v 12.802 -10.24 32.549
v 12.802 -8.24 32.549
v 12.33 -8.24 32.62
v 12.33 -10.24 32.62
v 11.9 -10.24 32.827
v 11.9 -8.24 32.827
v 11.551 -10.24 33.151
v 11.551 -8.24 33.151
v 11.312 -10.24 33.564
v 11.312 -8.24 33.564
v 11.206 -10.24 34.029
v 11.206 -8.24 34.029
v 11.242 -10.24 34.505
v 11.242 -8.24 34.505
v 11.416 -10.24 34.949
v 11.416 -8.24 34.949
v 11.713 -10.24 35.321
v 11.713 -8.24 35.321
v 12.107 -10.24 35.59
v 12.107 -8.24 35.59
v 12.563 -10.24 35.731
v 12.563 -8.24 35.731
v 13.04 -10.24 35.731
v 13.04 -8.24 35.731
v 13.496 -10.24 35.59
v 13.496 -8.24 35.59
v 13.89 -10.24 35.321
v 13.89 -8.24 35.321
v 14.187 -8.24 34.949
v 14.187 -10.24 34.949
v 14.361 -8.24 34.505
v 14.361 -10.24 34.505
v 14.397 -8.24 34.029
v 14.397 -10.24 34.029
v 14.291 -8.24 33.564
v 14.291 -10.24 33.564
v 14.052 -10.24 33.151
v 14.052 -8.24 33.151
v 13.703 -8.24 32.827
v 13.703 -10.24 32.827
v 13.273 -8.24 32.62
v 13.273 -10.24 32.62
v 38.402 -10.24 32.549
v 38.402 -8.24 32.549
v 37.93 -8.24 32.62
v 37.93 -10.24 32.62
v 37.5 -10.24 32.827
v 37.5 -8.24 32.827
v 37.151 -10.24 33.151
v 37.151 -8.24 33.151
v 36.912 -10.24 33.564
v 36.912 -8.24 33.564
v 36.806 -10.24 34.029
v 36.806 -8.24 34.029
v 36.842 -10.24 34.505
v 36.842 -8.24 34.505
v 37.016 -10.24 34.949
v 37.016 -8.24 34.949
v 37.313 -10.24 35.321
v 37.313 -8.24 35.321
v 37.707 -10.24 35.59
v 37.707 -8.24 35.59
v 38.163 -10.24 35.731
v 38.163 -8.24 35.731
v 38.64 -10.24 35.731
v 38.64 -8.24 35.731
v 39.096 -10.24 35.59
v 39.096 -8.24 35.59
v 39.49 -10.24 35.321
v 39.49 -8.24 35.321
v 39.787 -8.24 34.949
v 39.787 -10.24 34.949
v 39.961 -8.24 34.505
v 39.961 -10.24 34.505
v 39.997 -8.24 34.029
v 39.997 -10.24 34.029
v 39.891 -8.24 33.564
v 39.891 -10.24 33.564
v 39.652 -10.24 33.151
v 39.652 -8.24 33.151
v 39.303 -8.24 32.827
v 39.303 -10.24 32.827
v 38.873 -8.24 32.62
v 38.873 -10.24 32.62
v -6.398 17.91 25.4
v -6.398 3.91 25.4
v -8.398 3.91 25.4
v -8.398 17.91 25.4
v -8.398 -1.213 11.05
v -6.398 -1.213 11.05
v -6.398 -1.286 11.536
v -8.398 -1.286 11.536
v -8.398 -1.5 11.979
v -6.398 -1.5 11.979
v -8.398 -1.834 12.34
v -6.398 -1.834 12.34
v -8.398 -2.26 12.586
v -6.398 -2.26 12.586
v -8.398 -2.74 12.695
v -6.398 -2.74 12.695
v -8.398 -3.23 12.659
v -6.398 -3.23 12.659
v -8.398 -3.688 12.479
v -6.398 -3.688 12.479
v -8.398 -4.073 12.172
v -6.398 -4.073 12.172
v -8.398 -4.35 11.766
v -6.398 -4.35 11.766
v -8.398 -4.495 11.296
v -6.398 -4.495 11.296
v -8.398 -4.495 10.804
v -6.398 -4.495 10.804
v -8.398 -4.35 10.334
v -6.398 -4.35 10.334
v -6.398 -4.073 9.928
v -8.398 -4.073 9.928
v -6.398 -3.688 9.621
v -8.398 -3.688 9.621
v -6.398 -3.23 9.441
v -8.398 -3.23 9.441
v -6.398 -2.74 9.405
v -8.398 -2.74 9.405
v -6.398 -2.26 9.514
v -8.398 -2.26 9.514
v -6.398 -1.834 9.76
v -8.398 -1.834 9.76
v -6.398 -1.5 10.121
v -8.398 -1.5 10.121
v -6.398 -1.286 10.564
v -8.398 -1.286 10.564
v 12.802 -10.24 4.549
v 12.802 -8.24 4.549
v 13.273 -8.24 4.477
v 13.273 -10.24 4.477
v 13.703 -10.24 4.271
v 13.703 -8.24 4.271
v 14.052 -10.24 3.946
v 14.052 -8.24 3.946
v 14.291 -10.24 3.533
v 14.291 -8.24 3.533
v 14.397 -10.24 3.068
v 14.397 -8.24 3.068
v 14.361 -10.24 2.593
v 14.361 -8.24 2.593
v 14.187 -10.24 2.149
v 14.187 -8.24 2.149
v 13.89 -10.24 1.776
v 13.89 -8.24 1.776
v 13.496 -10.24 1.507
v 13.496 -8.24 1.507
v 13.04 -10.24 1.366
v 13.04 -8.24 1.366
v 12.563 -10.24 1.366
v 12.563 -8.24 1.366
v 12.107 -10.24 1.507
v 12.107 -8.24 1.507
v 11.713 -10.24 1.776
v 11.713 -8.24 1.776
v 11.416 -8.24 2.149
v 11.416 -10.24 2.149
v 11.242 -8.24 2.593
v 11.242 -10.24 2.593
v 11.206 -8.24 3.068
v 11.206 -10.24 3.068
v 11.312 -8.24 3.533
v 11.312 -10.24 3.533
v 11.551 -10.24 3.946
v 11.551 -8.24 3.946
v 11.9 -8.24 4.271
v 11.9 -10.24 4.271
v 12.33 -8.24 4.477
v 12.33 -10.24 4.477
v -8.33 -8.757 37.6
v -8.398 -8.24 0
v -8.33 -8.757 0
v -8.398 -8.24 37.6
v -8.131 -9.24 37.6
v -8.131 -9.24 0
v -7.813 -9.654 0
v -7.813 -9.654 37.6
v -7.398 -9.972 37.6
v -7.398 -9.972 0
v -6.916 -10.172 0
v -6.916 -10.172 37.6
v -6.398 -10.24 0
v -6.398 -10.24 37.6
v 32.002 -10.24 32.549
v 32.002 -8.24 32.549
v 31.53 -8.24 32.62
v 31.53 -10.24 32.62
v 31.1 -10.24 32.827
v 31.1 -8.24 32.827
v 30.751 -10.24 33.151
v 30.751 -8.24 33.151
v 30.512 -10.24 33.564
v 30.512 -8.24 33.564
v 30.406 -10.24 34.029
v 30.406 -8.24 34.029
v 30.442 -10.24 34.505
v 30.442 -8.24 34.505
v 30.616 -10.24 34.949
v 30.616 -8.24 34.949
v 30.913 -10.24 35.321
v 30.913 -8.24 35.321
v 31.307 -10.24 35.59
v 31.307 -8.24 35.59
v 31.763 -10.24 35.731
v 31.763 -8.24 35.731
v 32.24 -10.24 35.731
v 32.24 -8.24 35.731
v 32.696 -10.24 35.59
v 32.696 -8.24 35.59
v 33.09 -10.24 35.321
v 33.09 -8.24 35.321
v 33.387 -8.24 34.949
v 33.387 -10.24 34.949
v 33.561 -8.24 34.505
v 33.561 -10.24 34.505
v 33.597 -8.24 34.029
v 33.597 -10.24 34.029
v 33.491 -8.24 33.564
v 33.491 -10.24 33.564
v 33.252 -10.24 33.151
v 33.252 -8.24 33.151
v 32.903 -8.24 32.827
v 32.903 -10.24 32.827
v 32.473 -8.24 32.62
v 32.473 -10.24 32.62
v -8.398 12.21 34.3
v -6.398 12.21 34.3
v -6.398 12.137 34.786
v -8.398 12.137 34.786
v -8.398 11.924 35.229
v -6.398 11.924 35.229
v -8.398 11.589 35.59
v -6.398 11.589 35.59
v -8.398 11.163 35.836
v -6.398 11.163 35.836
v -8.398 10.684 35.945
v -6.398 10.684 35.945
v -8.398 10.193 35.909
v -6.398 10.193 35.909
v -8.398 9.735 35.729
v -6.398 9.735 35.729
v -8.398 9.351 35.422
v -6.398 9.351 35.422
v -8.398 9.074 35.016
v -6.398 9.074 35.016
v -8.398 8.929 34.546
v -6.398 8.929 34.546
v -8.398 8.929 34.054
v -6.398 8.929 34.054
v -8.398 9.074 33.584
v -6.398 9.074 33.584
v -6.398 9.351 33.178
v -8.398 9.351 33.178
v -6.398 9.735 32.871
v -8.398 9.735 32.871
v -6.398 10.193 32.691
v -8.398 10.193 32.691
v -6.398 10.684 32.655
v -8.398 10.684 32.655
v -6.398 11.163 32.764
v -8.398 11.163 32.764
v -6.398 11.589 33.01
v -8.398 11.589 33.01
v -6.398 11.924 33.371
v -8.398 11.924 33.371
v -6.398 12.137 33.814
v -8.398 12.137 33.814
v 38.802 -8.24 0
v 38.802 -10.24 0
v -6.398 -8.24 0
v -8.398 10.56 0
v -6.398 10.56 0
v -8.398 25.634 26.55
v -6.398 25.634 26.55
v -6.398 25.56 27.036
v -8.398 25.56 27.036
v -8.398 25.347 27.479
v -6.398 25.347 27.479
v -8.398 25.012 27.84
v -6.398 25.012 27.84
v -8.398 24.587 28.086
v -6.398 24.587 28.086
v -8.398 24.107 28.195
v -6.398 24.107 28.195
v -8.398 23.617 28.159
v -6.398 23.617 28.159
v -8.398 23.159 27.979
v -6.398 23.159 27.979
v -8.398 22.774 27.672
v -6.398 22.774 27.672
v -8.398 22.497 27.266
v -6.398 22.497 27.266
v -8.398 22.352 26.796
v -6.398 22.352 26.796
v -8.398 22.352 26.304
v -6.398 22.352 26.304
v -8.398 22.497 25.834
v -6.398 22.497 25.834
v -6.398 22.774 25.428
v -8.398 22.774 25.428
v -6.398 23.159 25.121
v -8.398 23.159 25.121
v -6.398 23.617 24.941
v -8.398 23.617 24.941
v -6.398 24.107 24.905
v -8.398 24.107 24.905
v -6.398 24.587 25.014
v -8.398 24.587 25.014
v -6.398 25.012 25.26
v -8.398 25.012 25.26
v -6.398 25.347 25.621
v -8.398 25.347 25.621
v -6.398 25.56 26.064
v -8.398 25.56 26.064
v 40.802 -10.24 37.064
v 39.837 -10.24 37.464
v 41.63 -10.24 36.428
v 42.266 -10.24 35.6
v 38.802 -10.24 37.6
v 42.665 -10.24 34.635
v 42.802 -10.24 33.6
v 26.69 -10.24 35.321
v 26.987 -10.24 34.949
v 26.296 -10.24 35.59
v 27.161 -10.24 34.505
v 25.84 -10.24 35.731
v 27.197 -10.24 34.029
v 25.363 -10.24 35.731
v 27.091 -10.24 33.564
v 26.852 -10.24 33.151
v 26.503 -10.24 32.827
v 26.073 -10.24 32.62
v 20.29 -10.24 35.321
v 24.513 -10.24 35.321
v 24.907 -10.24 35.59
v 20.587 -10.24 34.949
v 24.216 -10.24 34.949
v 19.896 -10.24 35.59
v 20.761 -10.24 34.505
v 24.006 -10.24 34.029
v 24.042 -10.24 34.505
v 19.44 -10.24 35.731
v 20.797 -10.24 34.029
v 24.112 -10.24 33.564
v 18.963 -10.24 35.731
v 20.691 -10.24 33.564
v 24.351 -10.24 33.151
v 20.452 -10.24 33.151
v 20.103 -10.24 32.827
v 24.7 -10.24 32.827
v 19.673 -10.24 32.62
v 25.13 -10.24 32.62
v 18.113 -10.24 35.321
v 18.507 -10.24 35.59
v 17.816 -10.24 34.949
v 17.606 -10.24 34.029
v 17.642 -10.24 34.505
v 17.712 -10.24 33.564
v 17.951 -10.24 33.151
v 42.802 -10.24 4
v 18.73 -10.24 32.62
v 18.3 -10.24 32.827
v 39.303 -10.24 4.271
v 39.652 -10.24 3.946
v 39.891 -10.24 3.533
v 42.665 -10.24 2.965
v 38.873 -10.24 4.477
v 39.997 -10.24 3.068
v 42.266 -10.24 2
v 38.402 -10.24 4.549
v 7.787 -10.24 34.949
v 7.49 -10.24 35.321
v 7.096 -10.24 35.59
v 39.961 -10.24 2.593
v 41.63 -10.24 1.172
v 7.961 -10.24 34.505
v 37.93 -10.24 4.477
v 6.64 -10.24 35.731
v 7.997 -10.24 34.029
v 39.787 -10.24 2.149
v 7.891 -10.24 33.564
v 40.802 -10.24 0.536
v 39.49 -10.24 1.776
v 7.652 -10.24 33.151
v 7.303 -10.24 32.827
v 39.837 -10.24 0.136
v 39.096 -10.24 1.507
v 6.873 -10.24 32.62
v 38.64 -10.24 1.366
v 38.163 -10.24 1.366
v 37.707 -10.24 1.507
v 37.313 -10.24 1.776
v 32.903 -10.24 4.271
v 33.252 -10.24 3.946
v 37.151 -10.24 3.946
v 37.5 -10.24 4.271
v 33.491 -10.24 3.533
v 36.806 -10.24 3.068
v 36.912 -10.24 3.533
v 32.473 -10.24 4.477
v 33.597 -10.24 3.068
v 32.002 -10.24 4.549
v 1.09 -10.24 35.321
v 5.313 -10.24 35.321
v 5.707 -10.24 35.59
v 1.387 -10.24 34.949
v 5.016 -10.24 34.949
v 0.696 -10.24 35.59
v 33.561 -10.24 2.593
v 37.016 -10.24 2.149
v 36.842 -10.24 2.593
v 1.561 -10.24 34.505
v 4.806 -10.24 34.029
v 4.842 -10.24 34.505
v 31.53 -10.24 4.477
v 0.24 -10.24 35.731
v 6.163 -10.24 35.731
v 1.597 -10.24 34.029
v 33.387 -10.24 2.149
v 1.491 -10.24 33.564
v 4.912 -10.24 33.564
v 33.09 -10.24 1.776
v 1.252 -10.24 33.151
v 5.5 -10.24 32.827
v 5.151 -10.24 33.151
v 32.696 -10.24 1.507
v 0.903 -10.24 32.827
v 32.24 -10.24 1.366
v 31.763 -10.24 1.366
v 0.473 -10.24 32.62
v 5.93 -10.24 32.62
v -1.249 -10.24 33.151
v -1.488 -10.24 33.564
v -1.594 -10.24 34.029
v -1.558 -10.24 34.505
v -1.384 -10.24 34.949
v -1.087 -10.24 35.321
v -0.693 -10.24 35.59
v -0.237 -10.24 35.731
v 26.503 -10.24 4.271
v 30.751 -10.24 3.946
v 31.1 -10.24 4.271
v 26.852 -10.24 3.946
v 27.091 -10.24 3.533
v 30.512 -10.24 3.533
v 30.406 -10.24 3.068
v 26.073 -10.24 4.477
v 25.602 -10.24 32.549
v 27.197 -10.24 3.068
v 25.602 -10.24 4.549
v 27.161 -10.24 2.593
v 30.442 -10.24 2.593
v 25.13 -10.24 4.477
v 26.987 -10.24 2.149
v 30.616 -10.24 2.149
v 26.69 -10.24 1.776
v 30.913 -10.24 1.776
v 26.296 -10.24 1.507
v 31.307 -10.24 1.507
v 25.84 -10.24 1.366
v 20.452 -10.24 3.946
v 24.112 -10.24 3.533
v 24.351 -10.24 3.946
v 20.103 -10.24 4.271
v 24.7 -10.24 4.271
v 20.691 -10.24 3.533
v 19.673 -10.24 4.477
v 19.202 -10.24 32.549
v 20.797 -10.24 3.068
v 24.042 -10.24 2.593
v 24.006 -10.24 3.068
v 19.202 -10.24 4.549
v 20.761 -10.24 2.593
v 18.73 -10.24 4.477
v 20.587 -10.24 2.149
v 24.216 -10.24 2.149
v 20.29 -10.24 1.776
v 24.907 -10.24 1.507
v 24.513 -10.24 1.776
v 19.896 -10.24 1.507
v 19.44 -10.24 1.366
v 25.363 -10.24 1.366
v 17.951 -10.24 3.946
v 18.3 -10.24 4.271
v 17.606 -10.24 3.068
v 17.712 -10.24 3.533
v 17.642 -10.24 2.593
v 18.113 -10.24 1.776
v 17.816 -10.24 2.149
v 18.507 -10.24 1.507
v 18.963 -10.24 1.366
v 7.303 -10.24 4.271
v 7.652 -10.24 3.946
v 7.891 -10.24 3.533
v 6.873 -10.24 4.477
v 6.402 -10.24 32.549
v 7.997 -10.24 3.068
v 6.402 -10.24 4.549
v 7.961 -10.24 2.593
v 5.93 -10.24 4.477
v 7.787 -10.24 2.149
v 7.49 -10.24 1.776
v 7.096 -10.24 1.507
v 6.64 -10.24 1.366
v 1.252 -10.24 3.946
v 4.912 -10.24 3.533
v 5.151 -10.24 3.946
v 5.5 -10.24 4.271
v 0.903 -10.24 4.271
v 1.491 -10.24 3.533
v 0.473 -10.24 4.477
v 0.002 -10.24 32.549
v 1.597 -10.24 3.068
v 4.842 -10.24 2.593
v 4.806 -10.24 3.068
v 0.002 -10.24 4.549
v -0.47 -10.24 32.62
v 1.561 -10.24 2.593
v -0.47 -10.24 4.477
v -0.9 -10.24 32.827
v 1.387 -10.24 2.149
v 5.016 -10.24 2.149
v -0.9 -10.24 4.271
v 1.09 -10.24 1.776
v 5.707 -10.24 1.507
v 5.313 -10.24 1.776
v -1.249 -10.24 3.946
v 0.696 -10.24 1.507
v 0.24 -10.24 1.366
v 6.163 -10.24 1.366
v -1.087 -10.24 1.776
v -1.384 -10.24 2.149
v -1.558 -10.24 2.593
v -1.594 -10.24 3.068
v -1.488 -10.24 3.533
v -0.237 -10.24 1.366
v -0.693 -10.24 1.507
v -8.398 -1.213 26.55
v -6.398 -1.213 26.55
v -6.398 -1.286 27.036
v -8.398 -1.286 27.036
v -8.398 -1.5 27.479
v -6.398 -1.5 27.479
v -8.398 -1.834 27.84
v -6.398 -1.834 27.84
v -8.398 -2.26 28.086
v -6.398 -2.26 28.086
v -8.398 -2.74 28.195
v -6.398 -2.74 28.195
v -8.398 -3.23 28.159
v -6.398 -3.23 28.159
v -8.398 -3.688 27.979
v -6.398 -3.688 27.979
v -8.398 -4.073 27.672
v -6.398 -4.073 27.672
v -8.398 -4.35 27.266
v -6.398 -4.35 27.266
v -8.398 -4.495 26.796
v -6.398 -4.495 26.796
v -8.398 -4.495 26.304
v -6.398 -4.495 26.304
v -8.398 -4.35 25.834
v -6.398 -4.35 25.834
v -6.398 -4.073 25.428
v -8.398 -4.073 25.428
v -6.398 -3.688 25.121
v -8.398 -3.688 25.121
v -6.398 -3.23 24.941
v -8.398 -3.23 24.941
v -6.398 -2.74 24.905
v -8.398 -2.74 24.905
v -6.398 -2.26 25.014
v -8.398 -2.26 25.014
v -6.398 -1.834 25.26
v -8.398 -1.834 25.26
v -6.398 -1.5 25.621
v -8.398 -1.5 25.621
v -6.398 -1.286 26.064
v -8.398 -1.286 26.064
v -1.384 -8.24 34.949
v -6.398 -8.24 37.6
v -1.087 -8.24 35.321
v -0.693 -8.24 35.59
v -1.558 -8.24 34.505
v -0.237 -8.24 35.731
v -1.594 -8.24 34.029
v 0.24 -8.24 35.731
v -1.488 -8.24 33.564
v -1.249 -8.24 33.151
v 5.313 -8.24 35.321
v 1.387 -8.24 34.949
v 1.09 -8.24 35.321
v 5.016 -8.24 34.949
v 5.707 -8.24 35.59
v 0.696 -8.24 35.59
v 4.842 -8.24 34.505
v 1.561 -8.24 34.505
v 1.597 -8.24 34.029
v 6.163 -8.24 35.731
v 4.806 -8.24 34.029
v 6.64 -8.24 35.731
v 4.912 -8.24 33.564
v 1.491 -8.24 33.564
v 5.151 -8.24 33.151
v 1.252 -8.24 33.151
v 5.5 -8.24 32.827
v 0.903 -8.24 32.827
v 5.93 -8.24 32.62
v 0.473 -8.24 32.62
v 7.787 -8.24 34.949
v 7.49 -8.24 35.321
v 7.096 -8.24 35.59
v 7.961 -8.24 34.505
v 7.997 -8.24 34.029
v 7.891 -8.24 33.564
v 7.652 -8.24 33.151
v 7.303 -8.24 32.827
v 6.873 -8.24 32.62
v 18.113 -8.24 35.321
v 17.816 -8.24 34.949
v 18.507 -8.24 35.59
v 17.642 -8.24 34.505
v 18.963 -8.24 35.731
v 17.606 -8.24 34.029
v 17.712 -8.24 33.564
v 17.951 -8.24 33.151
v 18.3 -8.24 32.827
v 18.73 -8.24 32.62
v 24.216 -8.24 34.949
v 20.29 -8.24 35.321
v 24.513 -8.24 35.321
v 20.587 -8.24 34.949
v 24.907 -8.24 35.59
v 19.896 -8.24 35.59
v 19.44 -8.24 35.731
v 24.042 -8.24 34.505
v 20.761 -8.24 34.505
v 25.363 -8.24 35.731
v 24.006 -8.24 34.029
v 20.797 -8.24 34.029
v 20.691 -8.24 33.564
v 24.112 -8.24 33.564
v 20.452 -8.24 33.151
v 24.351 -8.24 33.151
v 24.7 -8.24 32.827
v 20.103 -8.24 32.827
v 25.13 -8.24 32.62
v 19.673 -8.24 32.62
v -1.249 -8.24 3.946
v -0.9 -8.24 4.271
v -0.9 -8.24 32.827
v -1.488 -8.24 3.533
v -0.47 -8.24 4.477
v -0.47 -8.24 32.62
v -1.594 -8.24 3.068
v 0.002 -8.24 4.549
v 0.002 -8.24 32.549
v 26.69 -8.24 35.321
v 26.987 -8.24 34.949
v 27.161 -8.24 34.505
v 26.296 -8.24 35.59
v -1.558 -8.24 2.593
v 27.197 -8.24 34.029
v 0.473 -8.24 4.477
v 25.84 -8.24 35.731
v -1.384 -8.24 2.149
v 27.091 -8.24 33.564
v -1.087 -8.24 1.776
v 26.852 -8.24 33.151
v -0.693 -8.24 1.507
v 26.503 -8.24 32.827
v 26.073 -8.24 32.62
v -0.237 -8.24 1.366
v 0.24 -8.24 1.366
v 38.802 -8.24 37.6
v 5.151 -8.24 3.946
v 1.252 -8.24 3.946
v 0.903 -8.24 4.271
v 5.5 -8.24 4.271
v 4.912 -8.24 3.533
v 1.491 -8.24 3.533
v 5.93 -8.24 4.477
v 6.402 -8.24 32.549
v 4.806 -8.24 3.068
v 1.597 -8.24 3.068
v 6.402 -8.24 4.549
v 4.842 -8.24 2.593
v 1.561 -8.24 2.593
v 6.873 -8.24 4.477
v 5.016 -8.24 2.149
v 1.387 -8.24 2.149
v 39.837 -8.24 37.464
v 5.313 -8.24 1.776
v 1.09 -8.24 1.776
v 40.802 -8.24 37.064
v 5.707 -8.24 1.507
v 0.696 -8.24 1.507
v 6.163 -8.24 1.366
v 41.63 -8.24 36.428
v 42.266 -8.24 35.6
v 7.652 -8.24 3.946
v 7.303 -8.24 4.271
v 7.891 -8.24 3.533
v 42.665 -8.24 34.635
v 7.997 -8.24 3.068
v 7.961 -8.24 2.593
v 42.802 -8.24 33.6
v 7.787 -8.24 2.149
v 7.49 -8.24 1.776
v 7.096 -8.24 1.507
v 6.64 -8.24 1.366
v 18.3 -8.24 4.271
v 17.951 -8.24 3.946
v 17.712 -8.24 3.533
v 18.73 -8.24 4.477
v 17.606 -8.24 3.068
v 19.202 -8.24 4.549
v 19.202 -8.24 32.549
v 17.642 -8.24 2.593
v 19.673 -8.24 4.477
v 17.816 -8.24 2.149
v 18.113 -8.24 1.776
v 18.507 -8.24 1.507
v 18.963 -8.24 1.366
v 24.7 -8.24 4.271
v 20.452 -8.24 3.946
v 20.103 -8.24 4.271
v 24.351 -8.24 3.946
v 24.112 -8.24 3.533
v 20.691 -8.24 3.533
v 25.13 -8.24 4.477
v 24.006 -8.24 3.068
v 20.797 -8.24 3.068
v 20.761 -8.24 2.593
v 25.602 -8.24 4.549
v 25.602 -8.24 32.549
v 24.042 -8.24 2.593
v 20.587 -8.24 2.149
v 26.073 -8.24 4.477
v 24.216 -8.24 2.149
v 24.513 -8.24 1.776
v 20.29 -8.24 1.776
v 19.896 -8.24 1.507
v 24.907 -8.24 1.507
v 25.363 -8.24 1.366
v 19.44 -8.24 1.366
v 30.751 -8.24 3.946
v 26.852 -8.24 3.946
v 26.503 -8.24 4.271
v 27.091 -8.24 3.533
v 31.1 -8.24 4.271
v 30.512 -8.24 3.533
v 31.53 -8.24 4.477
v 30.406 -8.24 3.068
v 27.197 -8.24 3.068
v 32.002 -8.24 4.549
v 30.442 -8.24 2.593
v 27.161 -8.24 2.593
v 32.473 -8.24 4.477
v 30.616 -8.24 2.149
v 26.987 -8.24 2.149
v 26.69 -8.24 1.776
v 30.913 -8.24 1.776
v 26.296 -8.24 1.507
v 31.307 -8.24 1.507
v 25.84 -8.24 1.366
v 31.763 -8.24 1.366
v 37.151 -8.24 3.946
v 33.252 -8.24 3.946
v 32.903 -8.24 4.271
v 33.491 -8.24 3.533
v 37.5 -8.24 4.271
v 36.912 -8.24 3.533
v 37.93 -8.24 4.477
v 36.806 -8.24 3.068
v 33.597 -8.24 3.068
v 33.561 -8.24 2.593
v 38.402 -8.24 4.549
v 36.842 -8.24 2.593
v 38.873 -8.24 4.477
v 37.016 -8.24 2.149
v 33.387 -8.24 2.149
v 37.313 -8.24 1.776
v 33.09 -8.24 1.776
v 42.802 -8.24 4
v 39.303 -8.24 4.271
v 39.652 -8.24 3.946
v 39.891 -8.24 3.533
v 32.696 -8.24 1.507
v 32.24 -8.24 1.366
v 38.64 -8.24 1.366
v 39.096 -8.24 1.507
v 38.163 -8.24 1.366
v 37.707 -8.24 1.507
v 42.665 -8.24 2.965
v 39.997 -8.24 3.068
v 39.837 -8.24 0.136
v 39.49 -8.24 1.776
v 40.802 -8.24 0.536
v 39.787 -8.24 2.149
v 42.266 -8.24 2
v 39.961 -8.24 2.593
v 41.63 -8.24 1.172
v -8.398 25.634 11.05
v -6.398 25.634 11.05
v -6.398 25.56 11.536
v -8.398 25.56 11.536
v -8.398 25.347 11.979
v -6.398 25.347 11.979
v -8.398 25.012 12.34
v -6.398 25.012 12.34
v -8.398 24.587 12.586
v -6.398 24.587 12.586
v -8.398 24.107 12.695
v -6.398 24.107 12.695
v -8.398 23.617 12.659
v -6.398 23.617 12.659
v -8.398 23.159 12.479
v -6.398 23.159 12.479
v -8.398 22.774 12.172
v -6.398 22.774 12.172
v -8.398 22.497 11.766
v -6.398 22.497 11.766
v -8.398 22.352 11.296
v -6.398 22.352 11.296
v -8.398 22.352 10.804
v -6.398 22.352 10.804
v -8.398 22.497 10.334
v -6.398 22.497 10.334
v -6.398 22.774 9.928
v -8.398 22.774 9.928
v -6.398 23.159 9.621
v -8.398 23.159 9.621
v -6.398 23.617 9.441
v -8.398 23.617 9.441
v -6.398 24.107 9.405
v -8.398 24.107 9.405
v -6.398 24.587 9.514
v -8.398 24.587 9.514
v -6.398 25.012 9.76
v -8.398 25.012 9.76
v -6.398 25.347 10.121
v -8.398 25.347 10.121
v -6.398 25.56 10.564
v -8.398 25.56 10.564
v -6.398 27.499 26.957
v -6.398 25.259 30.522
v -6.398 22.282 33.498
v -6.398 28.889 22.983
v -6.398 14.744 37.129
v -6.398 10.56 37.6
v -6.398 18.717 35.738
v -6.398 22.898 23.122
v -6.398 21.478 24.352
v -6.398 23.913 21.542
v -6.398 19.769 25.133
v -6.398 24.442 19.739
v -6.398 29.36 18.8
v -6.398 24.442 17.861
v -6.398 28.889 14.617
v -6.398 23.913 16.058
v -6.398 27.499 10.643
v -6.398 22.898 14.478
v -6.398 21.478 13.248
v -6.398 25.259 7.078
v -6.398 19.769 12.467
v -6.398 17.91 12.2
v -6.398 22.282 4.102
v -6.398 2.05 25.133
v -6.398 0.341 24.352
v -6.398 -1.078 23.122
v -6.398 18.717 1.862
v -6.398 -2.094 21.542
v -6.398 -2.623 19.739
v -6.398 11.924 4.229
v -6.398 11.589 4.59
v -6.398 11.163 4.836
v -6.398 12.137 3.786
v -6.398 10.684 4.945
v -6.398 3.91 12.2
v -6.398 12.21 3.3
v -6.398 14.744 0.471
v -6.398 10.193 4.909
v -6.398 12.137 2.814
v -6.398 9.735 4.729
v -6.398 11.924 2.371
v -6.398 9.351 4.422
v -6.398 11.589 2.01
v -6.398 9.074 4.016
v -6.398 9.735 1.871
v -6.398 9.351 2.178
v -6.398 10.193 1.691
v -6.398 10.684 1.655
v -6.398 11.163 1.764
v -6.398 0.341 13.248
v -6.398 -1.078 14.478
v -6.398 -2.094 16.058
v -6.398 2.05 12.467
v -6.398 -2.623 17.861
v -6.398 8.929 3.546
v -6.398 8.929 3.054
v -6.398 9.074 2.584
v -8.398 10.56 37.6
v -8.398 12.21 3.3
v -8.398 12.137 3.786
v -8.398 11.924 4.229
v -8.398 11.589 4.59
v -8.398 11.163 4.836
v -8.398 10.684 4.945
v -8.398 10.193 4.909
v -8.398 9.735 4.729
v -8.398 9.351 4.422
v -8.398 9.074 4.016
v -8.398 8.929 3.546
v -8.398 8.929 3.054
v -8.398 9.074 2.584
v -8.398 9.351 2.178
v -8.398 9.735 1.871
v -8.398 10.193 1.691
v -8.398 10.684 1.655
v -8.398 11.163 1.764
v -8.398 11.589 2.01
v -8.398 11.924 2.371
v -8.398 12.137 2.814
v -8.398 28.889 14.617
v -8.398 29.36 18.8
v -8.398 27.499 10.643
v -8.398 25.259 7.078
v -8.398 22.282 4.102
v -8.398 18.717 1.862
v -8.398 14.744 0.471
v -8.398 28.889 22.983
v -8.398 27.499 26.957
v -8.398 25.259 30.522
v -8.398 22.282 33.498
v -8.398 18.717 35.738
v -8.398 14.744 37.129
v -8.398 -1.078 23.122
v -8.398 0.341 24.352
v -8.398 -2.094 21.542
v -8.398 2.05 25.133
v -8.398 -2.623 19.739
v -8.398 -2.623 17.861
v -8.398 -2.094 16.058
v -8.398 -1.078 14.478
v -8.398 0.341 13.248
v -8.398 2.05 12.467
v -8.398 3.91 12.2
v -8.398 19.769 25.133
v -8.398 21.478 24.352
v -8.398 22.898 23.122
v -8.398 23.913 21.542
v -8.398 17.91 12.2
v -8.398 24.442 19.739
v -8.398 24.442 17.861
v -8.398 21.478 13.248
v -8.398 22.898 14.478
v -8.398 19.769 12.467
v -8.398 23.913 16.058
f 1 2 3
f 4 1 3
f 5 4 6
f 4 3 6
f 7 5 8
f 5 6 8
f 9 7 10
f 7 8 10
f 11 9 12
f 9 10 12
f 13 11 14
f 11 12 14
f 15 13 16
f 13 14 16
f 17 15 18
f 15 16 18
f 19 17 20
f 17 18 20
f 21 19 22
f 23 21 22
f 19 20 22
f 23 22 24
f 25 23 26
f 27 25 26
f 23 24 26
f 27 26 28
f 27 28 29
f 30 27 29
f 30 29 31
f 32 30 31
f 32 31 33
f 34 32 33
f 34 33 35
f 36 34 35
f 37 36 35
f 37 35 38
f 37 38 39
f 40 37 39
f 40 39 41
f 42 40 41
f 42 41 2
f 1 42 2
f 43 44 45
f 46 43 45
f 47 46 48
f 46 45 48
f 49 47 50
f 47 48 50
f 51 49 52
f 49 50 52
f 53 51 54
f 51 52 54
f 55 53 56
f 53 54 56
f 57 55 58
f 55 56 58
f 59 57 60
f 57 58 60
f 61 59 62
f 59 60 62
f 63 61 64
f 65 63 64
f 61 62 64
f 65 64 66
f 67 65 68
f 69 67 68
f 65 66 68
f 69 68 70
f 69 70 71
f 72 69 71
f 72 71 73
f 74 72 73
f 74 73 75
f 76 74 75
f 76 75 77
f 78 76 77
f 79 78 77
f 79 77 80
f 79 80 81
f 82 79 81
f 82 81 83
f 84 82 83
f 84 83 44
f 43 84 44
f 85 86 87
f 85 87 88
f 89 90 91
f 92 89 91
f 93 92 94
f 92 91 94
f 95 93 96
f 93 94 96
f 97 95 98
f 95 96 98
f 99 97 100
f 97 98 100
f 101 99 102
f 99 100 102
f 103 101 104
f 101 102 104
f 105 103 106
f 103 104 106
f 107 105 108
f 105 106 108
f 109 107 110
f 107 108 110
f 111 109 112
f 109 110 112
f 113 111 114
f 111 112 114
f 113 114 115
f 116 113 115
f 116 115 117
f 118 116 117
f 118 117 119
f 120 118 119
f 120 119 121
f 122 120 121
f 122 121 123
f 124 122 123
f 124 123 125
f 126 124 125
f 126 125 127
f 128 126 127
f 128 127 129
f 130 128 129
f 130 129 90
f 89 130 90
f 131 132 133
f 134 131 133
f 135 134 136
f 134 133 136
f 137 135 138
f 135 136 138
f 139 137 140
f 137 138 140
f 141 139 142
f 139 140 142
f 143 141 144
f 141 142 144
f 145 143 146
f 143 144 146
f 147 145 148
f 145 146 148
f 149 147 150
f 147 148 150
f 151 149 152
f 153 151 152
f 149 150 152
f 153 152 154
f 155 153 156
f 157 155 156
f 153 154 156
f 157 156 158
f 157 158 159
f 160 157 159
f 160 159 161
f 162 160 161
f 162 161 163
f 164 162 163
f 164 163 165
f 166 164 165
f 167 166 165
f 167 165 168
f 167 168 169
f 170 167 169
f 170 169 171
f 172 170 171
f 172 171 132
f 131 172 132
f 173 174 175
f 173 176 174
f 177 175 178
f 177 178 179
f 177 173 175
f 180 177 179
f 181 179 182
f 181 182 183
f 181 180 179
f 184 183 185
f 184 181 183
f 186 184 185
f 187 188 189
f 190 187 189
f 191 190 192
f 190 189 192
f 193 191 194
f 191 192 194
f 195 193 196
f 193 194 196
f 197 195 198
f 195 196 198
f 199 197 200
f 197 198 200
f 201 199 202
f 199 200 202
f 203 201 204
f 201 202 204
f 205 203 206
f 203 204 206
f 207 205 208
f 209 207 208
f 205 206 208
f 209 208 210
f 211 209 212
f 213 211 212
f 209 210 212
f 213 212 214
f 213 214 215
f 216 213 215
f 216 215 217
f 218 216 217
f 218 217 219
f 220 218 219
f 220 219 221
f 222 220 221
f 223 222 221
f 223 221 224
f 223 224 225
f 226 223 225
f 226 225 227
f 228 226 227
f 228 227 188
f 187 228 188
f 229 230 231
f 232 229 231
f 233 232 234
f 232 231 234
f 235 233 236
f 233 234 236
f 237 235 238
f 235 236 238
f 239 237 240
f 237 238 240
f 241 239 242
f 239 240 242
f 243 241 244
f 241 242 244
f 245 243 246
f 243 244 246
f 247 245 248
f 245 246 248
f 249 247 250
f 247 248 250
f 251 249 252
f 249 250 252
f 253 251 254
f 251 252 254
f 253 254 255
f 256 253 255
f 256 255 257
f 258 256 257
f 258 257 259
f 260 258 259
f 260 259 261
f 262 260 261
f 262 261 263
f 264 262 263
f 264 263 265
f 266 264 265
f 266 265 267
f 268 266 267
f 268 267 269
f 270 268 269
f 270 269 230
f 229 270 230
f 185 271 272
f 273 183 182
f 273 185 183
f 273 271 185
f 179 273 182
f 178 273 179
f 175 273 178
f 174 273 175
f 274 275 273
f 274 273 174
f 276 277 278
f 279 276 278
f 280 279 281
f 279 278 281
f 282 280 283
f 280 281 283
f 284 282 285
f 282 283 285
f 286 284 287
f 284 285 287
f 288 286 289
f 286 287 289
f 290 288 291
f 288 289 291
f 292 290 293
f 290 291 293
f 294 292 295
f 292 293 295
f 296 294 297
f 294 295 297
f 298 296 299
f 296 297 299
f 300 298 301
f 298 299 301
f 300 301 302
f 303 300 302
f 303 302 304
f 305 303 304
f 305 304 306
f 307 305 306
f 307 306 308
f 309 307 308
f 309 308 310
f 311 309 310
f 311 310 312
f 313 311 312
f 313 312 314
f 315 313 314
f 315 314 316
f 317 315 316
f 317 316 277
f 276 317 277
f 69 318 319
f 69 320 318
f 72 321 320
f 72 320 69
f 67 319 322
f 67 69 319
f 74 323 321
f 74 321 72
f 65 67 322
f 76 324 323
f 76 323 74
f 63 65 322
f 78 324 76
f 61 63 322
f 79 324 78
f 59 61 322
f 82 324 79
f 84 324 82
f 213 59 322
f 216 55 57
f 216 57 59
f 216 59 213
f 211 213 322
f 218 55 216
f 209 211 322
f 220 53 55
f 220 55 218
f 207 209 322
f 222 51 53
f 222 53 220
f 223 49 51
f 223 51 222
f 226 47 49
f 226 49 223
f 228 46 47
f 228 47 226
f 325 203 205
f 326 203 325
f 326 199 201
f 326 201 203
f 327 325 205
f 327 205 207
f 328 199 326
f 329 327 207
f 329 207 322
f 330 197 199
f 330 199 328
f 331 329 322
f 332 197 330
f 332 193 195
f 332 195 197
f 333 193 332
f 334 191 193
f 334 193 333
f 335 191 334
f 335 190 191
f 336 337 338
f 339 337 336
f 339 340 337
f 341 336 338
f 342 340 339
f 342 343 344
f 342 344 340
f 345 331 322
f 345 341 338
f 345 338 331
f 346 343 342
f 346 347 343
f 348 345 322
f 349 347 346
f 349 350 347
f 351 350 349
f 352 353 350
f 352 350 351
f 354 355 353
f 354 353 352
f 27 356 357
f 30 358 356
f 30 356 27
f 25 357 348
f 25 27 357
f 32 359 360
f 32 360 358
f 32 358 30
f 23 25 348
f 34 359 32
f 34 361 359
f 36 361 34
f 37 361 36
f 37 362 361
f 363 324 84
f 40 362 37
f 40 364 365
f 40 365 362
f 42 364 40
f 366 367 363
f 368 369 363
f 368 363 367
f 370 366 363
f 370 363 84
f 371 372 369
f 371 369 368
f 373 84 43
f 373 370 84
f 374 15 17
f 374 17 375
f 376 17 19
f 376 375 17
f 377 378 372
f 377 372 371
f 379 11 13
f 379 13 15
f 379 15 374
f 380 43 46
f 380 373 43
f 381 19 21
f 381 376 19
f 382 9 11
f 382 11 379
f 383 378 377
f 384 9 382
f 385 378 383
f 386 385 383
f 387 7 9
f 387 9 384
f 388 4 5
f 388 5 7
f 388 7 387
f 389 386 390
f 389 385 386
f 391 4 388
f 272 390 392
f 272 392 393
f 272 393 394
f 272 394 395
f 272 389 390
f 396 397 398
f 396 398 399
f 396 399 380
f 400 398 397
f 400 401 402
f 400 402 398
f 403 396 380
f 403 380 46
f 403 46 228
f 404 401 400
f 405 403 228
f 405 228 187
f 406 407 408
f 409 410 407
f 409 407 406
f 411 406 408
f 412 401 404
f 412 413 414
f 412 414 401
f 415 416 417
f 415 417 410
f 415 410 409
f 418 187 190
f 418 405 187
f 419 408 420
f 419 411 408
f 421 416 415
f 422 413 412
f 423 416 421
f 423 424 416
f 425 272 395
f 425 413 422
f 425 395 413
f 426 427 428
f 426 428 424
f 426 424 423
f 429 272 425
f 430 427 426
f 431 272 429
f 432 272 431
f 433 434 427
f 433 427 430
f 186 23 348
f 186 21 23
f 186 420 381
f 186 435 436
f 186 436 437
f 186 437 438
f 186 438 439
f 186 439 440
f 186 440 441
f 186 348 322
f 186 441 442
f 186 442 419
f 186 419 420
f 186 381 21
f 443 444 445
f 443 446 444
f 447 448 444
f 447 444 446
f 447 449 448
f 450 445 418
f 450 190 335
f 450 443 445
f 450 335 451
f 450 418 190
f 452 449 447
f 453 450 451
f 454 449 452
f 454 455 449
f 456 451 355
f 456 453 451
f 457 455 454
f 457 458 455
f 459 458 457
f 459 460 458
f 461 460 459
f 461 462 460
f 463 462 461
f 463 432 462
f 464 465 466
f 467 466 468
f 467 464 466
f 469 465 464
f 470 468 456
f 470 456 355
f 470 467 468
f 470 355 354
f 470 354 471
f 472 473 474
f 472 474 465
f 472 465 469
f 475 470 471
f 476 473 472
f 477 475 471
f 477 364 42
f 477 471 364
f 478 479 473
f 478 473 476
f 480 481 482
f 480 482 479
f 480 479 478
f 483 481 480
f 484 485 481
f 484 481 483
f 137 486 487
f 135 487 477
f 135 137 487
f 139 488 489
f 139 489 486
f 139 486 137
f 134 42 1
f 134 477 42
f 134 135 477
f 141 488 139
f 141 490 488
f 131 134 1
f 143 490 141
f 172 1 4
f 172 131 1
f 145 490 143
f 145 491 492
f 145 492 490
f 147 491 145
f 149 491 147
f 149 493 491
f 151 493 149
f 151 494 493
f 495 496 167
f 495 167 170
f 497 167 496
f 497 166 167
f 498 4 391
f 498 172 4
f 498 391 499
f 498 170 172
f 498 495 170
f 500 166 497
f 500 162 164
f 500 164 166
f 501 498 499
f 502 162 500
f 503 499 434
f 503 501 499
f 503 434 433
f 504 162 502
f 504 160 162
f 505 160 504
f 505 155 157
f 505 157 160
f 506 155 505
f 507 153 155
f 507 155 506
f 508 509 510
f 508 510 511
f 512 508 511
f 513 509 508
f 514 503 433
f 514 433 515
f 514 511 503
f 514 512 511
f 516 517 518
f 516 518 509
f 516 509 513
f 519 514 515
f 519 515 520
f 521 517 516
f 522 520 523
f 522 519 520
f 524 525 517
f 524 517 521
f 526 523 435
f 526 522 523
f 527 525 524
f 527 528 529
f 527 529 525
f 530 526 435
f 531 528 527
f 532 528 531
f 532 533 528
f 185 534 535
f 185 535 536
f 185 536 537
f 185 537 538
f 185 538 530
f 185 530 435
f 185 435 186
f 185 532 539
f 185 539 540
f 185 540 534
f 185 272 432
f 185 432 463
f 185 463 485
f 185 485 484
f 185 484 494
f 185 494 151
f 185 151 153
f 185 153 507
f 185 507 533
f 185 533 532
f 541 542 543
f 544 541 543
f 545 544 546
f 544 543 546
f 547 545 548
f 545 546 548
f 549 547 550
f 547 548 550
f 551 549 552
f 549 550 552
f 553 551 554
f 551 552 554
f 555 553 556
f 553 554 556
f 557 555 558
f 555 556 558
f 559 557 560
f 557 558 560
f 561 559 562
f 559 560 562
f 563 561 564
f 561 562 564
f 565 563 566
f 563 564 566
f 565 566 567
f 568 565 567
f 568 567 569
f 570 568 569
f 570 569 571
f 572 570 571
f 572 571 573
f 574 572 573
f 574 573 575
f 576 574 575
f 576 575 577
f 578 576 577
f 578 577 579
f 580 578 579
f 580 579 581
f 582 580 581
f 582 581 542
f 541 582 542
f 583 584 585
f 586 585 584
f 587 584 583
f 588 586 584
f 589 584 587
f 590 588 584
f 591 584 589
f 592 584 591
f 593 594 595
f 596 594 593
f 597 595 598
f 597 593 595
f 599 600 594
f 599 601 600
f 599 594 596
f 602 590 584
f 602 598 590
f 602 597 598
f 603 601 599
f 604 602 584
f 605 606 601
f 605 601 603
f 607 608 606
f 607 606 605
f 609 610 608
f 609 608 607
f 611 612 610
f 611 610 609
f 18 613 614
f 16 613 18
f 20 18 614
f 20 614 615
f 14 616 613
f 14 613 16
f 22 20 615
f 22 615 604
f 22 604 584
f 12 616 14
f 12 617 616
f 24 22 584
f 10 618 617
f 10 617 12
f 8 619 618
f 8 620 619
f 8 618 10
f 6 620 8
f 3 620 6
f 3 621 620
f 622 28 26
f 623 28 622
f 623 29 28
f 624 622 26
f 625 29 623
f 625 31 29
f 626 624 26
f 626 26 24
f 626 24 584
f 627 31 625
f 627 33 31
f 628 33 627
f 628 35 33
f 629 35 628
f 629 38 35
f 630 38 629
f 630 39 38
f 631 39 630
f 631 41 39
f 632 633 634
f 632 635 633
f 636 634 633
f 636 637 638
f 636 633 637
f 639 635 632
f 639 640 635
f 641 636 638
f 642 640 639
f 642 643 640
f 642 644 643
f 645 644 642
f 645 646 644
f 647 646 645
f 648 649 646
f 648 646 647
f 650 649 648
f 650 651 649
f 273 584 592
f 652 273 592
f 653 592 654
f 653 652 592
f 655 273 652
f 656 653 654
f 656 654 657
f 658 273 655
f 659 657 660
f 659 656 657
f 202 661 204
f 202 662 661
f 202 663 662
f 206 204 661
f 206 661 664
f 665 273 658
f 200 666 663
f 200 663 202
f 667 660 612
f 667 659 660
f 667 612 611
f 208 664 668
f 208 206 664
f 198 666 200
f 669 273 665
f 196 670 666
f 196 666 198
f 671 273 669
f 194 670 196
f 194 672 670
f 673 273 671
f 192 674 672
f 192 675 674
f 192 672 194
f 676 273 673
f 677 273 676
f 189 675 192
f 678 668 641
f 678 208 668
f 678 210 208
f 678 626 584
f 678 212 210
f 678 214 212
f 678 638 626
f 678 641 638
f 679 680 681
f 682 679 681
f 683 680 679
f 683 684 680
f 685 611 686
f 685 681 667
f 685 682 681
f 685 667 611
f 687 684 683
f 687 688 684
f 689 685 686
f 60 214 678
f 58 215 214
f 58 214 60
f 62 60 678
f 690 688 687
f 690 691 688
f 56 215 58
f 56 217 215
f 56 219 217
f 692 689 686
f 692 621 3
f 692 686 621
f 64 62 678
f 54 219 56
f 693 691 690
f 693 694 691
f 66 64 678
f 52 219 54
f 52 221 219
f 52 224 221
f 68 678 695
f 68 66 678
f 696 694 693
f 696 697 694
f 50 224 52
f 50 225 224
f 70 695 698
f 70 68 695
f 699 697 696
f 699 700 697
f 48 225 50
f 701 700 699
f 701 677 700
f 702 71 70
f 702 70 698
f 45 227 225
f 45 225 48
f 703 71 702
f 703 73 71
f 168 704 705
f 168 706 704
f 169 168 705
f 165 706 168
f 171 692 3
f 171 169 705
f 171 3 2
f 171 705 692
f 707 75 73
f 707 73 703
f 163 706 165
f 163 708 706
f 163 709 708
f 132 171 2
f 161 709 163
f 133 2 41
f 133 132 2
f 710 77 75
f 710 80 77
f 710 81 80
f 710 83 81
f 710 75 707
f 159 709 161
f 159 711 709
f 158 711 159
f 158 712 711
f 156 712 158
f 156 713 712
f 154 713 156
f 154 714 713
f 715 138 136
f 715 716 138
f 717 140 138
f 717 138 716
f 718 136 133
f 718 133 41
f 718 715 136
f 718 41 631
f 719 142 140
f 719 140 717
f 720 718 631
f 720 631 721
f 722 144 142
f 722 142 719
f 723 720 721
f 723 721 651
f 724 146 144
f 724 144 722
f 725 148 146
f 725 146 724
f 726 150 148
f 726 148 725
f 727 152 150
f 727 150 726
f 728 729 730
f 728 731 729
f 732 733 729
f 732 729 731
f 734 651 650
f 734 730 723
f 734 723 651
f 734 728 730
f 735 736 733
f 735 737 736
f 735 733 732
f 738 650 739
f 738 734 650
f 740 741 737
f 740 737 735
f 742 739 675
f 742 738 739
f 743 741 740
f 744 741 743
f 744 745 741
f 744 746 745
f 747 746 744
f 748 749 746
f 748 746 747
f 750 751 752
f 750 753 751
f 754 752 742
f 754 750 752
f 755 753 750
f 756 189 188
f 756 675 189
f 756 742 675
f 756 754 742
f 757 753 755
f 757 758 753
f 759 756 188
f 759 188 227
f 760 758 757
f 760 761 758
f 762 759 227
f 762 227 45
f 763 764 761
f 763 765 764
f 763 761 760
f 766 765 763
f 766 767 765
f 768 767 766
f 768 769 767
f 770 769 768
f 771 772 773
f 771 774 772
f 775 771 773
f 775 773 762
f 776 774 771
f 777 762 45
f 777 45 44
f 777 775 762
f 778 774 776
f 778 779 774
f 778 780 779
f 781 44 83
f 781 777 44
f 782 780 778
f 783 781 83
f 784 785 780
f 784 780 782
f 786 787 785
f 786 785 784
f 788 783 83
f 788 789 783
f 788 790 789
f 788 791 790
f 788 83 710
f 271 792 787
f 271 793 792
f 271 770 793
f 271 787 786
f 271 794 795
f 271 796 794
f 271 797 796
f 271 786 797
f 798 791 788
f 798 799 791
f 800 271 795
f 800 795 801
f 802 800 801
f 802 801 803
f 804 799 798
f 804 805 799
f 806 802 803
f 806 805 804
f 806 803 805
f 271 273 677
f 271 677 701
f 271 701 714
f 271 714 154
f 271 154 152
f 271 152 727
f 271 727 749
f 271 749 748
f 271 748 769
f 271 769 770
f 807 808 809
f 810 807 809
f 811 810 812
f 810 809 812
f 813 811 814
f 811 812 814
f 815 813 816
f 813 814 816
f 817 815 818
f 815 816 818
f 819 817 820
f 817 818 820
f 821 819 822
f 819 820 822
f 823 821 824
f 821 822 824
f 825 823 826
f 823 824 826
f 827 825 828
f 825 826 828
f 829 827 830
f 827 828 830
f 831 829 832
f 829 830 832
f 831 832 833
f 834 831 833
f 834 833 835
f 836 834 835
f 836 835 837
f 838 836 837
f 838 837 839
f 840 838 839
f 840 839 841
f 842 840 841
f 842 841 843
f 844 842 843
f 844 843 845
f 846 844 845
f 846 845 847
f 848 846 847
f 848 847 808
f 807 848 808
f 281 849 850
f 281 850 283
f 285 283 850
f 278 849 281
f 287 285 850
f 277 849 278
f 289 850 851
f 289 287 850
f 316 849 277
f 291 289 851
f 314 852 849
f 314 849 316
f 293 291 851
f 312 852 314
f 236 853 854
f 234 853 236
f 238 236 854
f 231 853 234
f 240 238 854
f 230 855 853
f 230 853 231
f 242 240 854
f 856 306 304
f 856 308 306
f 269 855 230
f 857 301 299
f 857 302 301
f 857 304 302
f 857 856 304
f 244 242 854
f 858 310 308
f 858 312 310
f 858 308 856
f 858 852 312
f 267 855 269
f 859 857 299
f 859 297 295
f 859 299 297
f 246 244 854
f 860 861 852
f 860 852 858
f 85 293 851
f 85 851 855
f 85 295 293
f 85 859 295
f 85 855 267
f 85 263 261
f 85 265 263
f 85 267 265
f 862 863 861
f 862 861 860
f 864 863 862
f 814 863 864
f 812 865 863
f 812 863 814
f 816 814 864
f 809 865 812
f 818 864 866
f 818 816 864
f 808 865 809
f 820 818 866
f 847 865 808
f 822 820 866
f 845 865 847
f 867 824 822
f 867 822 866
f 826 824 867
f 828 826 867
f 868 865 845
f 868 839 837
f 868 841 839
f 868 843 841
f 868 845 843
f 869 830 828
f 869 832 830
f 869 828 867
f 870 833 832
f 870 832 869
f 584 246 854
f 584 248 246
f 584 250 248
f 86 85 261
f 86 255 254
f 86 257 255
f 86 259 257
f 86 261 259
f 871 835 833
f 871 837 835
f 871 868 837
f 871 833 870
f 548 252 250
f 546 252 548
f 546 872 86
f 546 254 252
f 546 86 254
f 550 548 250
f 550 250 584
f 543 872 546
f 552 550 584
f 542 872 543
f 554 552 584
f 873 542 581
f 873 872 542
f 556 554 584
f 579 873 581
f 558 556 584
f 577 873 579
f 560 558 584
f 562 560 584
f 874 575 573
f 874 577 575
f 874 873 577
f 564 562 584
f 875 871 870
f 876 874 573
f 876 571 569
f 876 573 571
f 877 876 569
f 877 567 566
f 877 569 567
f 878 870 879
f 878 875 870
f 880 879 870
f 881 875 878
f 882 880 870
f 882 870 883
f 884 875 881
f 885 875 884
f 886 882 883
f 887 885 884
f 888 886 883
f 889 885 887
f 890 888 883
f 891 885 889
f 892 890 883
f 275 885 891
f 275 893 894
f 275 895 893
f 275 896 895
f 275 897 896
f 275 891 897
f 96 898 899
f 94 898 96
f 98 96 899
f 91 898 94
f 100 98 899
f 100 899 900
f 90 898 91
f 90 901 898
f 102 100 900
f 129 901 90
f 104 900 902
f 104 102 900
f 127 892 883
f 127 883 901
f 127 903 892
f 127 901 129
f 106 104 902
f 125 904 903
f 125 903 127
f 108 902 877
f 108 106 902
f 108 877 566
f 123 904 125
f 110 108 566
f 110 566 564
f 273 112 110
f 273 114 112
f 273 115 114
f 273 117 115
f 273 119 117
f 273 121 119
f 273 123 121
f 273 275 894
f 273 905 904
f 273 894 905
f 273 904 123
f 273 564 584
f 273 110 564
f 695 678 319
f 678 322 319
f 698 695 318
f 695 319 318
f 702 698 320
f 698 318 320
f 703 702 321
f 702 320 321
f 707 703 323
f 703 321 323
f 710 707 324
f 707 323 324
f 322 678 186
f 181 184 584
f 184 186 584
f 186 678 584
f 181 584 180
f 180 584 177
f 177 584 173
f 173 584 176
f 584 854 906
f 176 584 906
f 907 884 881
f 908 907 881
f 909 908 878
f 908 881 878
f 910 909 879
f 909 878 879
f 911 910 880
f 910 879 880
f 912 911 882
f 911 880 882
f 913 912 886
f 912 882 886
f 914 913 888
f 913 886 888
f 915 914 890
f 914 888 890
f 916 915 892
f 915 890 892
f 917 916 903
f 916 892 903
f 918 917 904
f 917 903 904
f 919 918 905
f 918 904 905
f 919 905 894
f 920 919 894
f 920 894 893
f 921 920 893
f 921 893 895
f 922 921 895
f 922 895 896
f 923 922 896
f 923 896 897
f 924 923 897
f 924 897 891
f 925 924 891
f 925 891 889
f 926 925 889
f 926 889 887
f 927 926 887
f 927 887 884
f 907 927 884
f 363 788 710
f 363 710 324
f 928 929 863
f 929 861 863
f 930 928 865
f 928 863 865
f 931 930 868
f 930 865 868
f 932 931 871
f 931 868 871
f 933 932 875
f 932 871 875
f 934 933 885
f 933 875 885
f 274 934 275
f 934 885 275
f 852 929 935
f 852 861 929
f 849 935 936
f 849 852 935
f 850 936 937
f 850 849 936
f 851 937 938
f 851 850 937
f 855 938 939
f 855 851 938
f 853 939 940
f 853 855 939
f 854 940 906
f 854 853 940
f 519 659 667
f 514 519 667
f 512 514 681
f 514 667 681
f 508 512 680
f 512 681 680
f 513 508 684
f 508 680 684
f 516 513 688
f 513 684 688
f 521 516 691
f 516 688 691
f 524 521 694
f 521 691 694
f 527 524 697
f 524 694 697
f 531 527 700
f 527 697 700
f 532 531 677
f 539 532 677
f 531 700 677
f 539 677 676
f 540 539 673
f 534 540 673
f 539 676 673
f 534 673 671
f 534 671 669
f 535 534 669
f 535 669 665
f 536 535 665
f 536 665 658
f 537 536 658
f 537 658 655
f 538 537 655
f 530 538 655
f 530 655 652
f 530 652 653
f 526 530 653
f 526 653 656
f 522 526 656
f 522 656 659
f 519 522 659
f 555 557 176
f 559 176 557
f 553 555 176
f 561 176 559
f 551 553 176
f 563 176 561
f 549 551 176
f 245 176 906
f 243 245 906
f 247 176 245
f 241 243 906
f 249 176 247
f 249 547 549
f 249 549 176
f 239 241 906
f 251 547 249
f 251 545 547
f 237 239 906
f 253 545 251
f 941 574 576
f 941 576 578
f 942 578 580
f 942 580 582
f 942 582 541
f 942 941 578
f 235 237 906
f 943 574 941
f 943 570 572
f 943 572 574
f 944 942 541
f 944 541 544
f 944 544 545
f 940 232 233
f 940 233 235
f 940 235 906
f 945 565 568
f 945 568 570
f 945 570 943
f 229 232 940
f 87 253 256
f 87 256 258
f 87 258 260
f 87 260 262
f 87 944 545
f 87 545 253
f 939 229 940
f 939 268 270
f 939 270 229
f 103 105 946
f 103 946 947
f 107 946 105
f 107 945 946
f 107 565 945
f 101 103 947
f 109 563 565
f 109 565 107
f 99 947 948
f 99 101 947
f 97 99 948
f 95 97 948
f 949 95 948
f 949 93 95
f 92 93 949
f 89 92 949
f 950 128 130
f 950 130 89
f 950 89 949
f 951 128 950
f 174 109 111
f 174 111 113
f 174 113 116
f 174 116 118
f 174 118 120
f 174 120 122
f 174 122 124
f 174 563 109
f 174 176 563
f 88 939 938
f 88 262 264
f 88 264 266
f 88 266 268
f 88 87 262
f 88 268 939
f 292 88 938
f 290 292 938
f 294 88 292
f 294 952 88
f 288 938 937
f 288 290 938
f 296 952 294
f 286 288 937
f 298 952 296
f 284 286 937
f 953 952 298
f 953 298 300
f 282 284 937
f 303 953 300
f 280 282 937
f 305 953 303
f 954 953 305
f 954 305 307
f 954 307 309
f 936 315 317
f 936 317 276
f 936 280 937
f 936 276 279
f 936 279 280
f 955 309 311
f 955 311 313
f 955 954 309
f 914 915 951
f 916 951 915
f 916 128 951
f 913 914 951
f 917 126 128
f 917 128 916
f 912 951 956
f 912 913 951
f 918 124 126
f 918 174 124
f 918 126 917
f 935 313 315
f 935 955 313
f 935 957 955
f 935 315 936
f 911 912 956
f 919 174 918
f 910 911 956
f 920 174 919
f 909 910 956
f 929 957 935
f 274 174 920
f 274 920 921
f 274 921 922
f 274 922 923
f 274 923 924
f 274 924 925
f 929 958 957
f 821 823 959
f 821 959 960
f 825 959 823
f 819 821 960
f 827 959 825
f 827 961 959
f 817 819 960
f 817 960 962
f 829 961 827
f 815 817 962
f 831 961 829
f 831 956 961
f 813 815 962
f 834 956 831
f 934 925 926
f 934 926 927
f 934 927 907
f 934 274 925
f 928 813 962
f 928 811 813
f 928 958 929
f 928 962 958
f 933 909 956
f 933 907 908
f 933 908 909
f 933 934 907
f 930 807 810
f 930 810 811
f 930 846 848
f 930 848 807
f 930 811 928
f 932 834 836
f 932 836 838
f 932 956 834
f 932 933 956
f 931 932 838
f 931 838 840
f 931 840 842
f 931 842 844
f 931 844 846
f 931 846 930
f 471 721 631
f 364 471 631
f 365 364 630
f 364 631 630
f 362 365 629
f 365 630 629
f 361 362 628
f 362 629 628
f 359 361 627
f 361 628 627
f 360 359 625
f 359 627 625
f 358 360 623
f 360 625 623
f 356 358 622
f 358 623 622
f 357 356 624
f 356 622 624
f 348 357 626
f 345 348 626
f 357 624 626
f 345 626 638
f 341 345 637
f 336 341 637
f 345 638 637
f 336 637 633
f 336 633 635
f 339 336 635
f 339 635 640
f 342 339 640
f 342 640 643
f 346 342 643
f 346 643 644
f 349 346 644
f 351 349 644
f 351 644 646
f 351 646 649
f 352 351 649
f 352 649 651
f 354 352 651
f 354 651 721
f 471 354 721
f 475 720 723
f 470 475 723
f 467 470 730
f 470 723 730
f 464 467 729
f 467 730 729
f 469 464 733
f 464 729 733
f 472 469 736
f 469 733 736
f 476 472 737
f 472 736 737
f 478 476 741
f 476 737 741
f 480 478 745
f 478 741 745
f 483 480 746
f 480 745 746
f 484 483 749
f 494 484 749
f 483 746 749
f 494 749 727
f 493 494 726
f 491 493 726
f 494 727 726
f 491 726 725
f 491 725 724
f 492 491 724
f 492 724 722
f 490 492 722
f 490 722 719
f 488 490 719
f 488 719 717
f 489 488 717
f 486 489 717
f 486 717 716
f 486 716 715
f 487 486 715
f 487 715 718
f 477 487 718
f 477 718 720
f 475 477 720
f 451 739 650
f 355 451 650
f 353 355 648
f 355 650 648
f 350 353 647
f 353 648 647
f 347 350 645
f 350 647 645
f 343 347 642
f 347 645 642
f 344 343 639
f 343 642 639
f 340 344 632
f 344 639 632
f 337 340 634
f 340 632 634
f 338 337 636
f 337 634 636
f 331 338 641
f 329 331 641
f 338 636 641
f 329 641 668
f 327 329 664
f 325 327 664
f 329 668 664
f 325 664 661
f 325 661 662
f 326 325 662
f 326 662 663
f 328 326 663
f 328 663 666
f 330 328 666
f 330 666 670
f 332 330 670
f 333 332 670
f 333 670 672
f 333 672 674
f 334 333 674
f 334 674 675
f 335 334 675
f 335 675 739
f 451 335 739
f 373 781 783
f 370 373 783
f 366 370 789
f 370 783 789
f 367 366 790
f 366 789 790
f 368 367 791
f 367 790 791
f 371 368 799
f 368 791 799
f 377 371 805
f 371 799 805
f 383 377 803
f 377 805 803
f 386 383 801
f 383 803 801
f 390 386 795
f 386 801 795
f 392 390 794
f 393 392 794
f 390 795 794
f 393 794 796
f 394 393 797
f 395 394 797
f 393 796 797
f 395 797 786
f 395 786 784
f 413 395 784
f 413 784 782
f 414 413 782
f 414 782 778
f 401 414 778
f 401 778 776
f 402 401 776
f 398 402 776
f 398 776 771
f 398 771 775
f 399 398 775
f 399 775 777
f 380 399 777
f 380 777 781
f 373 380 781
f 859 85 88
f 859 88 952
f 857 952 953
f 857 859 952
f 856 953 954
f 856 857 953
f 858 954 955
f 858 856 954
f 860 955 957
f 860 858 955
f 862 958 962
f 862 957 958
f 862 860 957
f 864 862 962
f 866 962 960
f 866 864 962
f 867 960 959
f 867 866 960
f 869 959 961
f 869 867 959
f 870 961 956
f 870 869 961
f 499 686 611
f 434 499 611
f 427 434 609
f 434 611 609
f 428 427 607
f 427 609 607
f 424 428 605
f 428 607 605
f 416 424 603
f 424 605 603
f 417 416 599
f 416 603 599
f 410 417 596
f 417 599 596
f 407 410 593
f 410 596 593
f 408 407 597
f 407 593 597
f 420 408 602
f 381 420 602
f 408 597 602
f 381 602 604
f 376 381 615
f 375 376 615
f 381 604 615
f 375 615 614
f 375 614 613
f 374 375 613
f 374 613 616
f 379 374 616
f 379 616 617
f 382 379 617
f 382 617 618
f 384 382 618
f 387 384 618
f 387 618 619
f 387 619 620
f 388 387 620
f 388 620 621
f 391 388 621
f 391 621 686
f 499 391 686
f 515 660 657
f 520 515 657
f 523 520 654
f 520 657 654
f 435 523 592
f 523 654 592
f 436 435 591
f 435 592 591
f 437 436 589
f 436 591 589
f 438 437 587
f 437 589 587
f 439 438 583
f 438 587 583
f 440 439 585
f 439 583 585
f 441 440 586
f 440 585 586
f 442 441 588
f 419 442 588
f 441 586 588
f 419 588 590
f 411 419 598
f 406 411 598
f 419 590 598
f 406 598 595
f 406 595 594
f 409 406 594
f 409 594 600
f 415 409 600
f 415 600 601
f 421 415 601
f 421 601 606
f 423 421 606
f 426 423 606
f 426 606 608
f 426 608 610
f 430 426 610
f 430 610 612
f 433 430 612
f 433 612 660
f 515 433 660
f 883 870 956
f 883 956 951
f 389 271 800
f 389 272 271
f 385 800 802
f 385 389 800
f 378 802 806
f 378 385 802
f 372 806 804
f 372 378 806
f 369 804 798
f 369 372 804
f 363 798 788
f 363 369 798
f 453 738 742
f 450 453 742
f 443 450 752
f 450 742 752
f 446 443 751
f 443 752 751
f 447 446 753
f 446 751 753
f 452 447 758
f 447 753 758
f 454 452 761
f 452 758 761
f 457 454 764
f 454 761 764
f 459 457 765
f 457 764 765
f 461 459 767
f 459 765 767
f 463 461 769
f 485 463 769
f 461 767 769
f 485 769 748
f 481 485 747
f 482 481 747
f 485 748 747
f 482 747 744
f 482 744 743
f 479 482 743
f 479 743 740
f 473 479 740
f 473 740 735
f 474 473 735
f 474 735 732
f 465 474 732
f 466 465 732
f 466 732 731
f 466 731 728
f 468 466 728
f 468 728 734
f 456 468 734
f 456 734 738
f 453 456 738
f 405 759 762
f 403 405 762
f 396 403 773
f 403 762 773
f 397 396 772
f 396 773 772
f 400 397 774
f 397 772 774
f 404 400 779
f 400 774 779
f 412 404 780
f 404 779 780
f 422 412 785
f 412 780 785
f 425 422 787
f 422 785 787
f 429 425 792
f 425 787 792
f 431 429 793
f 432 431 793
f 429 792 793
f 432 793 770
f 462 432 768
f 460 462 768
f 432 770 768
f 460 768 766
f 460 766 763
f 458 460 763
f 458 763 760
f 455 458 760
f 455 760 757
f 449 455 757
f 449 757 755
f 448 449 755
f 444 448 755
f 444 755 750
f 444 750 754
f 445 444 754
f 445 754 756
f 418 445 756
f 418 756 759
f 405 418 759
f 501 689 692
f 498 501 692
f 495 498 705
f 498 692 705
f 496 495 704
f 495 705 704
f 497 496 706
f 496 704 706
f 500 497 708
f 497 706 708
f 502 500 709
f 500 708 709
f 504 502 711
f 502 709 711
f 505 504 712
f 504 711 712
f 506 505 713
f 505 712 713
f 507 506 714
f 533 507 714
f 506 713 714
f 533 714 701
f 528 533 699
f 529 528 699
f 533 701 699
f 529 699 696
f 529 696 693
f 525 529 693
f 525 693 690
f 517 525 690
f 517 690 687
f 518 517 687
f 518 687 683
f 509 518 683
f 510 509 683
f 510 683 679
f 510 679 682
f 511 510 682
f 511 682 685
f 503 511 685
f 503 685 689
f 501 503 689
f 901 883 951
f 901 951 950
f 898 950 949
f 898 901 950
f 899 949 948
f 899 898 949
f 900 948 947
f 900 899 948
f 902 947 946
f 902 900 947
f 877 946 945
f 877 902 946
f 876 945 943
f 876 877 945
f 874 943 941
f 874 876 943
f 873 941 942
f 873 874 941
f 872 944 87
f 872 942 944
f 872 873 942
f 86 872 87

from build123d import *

# Parameters (mm, degrees)
BOSS_EXTRUDE1_DEPTH = 37.6
SKETCH2_R           = 1.65
CUT_EXTRUDE1_DEPTH  = 69.530502022
SKETCH3_R           = 1.6
CUT_EXTRUDE2_DEPTH  = 69.260471168
FILLET1_R           = 18.8
FILLET2_R           = 2
FILLET3_R           = 4


with BuildPart() as part:
    # Sketch1 → Boss-Extrude1 (new body)
    with BuildSketch(Plane.XY):
        Polygon((-8.398458859, 29.360342427), (-6.398458859, 29.360342427), (-6.398458859, -8.239657573), (42.801541141, -8.239657573), (42.801541141, -10.239657573), (-8.398458859, -10.239657573), align=None)
    extrude(amount=BOSS_EXTRUDE1_DEPTH)

    # Sketch2 → Cut-Extrude1 (cut, through all)
    with BuildSketch(Plane(origin=(-6.398458859, 0, 0), x_dir=(0, 0, -1), z_dir=(1, 0, 0))):
        with Locations(Location((-34.3, 10.560342427, 0), (0, 0, 90))):
            Circle(SKETCH2_R)
        with Locations(Location((-26.55, 23.983736186, 0), (0, 0, 90))):
            Circle(SKETCH2_R)
        with Locations(Location((-11.05, 23.983736186, 0), (0, 0, 90))):
            Circle(SKETCH2_R)
        with Locations(Location((-3.3, 10.560342427, 0), (0, 0, 90))):
            Circle(SKETCH2_R)
        with Locations(Location((-11.05, -2.863051332, 0), (0, 0, 90))):
            Circle(SKETCH2_R)
        with Locations(Location((-26.55, -2.863051332, 0), (0, 0, 90))):
            Circle(SKETCH2_R)
        with BuildLine():
            Line((-12.2, 17.909663616), (-12.2, 3.909663616))
            ThreePointArc((-12.2, 3.909663616), (-18.8, -2.690336384), (-25.4, 3.909663616))
            Line((-25.4, 3.909663616), (-25.4, 17.909663616))
            ThreePointArc((-25.4, 17.909663616), (-18.8, 24.509663616), (-12.2, 17.909663616))
        make_face()
    extrude(amount=-CUT_EXTRUDE1_DEPTH, mode=Mode.SUBTRACT)

    # Sketch3 → Cut-Extrude2 (cut, through all)
    with BuildSketch(Plane(origin=(0, -8.239657573, 0), x_dir=(1, 0, 0), z_dir=(0, 1, 0))):
        with Locations(Location((0.001541141, -2.94858142, 0), (0, 0, 270))):
            Circle(SKETCH3_R)
        with Locations(Location((6.401541141, -2.94858142, 0), (0, 0, 270))):
            Circle(SKETCH3_R)
        with Locations(Location((12.801541141, -2.94858142, 0), (0, 0, 270))):
            Circle(SKETCH3_R)
        with Locations(Location((19.201541141, -2.94858142, 0), (0, 0, 270))):
            Circle(SKETCH3_R)
        with Locations(Location((25.601541141, -2.94858142, 0), (0, 0, 270))):
            Circle(SKETCH3_R)
        with Locations(Location((32.001541141, -2.94858142, 0), (0, 0, 270))):
            Circle(SKETCH3_R)
        with Locations(Location((38.401541141, -2.94858142, 0), (0, 0, 270))):
            Circle(SKETCH3_R)
        with Locations(Location((38.401541141, -34.14858142, 0), (0, 0, 90))):
            Circle(SKETCH3_R)
        with Locations(Location((32.001541141, -34.14858142, 0), (0, 0, 90))):
            Circle(SKETCH3_R)
        with Locations(Location((25.601541141, -34.14858142, 0), (0, 0, 90))):
            Circle(SKETCH3_R)
        with Locations(Location((19.201541141, -34.14858142, 0), (0, 0, 90))):
            Circle(SKETCH3_R)
        with Locations(Location((12.801541141, -34.14858142, 0), (0, 0, 90))):
            Circle(SKETCH3_R)
        with Locations(Location((6.401541141, -34.14858142, 0), (0, 0, 90))):
            Circle(SKETCH3_R)
        with Locations(Location((0.001541141, -34.14858142, 0), (0, 0, 90))):
            Circle(SKETCH3_R)
    extrude(amount=-CUT_EXTRUDE2_DEPTH, mode=Mode.SUBTRACT)

    # Fillet1
    fillet1_edges = [part.edges().sort_by_distance(p)[0] for p in [
        (-7.398458859, 29.360342427, 0),
        (-7.398458859, 29.360342427, 37.6),
    ]]
    fillet(fillet1_edges, radius=FILLET1_R - 0.0001)  # a hair under: the kernel refuses the full size

    # Fillet2
    fillet2_edges = [part.edges().sort_by_distance(p)[0] for p in [
        (-8.398458859, -10.239657573, 18.8),
    ]]
    fillet(fillet2_edges, radius=FILLET2_R)

    # Fillet3
    fillet3_edges = [part.edges().sort_by_distance(p)[0] for p in [
        (42.801541141, -9.239657573, 37.6),
        (42.801541141, -9.239657573, 0),
    ]]
    fillet(fillet3_edges, radius=FILLET3_R)


solid = part.part
